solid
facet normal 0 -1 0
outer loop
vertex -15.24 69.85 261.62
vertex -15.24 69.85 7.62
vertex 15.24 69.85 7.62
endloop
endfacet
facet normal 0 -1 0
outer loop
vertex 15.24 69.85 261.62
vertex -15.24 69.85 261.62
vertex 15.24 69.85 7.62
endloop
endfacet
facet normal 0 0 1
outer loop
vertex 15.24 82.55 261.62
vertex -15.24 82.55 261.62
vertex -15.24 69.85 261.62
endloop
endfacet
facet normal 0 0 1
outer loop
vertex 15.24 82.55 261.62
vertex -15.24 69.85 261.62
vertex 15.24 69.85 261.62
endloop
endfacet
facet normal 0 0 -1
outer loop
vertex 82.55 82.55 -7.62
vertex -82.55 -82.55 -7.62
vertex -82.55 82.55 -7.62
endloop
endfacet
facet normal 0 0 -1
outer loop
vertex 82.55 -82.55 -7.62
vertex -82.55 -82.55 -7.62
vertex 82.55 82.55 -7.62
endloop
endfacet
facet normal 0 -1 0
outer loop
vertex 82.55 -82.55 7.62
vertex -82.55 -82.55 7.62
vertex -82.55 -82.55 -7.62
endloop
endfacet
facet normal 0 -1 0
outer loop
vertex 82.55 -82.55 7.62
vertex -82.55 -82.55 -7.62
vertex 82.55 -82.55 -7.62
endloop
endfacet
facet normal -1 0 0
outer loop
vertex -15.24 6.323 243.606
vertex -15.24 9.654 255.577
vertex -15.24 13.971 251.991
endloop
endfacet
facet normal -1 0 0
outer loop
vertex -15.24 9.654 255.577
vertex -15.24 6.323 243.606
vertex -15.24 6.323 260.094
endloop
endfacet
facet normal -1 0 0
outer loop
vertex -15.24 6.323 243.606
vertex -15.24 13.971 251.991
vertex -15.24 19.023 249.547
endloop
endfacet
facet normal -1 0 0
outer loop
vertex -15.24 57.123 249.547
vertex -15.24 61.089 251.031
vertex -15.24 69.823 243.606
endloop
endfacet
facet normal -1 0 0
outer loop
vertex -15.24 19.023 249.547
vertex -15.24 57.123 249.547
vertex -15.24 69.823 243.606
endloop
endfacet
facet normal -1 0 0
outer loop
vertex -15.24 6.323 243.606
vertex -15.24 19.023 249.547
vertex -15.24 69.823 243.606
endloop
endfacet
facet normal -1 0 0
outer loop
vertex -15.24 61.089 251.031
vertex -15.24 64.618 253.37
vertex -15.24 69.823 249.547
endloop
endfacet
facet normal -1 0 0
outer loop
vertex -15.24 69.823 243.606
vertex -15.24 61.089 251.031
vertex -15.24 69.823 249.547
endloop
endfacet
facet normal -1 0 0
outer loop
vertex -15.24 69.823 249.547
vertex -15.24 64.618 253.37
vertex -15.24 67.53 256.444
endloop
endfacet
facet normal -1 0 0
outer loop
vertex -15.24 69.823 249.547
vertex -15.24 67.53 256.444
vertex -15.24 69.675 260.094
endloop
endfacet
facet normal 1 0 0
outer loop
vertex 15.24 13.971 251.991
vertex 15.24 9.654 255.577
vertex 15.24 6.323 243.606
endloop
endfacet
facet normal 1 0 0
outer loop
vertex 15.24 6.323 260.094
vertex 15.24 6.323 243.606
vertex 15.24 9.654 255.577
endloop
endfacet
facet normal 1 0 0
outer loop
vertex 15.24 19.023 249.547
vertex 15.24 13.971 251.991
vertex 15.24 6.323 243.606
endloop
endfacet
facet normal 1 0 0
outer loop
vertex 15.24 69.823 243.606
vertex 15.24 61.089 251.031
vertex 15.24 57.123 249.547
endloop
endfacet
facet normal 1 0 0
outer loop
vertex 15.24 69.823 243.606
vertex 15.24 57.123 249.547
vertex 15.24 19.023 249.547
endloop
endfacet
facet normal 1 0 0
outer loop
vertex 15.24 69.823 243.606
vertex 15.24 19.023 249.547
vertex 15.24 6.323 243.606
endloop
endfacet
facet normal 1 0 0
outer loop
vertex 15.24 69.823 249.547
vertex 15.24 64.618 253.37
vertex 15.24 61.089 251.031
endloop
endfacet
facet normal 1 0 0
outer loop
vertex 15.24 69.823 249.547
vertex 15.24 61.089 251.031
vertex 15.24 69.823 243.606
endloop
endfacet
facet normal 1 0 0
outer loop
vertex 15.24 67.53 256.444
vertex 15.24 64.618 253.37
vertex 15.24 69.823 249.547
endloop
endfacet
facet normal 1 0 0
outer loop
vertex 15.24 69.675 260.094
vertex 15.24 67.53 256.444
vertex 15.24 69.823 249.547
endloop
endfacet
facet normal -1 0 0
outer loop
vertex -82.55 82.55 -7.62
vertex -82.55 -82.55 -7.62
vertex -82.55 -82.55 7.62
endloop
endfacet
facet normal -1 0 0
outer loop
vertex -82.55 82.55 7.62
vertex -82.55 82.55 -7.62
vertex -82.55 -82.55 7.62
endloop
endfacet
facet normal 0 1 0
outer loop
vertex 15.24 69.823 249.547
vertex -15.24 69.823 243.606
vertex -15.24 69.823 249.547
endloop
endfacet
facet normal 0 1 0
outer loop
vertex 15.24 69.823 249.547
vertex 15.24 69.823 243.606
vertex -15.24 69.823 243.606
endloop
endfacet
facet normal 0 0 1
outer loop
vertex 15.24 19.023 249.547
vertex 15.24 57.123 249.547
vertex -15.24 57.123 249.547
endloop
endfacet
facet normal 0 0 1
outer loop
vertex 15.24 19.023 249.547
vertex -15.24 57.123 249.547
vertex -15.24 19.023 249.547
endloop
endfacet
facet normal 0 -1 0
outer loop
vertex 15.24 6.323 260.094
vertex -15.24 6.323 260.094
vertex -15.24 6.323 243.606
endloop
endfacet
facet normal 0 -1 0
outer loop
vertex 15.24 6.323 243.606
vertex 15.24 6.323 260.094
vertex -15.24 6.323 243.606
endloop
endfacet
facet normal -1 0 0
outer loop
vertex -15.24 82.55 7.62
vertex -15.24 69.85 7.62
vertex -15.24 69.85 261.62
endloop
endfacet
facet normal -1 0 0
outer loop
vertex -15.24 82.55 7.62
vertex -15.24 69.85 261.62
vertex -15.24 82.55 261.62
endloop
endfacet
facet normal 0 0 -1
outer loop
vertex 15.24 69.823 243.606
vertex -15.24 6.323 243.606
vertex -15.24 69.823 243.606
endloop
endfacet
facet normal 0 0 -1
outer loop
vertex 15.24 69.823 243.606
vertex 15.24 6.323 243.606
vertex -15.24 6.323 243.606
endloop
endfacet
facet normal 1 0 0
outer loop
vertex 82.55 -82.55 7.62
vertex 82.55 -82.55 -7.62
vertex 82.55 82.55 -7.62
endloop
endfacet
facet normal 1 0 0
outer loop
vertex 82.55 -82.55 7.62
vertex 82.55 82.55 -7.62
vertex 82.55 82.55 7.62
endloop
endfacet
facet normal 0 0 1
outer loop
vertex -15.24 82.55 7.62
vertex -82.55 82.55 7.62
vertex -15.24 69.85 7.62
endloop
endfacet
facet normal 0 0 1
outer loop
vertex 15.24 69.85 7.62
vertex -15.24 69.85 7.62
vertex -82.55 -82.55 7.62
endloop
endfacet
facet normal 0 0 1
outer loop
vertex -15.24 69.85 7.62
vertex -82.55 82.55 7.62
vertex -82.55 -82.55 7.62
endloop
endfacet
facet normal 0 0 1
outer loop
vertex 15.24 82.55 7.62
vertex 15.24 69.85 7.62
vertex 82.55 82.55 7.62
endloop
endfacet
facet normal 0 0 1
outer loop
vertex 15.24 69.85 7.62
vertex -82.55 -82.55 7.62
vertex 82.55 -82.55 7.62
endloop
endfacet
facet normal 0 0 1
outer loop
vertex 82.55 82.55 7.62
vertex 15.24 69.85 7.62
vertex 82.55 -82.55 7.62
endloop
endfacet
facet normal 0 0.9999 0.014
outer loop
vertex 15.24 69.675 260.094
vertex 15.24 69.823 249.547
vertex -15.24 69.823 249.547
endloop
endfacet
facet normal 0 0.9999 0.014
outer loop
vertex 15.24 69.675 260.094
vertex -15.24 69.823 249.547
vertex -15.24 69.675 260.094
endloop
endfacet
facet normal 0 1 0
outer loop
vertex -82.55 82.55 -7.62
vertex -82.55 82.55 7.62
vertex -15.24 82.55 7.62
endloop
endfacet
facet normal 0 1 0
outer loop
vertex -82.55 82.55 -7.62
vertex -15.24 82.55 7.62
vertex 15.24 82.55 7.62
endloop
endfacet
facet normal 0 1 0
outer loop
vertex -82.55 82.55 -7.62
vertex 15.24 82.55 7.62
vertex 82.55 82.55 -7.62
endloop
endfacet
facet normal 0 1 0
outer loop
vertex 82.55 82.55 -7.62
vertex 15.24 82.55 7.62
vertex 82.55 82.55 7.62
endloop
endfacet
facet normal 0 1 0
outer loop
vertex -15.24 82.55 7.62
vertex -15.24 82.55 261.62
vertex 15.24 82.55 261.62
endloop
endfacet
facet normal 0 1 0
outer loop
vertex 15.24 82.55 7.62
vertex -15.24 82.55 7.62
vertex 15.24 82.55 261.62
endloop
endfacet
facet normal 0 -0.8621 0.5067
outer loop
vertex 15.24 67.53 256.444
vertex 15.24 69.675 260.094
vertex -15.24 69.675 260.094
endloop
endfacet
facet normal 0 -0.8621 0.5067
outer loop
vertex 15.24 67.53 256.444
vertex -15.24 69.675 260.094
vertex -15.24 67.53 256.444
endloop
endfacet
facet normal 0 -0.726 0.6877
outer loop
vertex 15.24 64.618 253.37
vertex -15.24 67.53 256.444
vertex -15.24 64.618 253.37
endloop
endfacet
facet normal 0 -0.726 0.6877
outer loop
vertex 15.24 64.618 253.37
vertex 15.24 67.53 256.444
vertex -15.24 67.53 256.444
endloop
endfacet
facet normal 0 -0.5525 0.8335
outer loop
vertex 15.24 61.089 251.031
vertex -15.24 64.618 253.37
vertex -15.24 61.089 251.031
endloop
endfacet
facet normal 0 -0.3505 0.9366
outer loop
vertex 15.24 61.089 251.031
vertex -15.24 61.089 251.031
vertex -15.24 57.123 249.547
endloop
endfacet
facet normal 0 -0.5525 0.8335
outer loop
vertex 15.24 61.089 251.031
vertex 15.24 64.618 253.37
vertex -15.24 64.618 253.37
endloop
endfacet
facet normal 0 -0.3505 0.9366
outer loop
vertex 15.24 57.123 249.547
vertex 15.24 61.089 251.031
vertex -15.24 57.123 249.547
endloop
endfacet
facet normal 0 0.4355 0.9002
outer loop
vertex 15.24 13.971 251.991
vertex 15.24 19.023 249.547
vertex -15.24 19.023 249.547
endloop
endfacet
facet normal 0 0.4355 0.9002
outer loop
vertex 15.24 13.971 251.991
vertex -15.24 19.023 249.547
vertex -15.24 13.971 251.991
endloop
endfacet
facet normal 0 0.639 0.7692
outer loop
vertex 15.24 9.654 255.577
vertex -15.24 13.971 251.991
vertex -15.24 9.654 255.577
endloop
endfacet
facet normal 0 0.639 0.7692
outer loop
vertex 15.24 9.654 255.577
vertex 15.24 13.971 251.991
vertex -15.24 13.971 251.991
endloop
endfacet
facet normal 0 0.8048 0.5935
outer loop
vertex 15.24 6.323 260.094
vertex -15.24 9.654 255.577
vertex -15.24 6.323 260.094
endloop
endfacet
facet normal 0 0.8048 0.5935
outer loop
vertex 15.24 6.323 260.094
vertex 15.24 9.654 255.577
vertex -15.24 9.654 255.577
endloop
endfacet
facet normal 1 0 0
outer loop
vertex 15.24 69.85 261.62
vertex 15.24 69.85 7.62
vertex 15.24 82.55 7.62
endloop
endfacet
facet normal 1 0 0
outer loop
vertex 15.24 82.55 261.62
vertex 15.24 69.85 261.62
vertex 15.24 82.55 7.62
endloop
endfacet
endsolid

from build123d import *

# Parameters (mm, degrees)
F0_W     = 165.1
F0_H     = 15.24
F1_DEPTH = 82.55
F2_W     = 30.48
F2_H     = 12.7
F3_DEPTH = 254
F5_DEPTH = 15.24


with BuildPart() as f1:
    # F0 (on Front) → F1 (new body, symmetric)
    with BuildSketch(Plane.XZ):
        Rectangle(F0_W, F0_H)
    extrude(amount=F1_DEPTH, both=True)

    # F2 (on face) → F3 (join)
    with BuildSketch(Plane.XY.offset(7.62)):
        with Locations((0, 76.2)):
            Rectangle(F2_W, F2_H)
    extrude(amount=F3_DEPTH)


with BuildPart() as f5:
    # F4 (on Right) → F5 (new body, symmetric)
    with BuildSketch(Plane.YZ):
        Polygon((69.8231831193, 243.6058757288), (69.8231831193, 249.5466768742), (57.1231831193, 249.5466768742), (19.0231831193, 249.5466768742), (6.3231831193, 249.5466768742), (6.3231831193, 243.6058757288), align=None)
        with BuildLine():
            Line((57.1231831193, 249.5466768742), (69.8231831193, 249.5466768742))
            Line((69.8231831193, 249.5466768742), (69.6746185422, 260.0943446159))
            ThreePointArc((69.6746185422, 260.0943446159), (64.6179404455, 253.3698870264), (57.1231831193, 249.5466768742))
        make_face()
        with BuildLine():
            Line((6.3231831193, 249.5466768742), (19.0231831193, 249.5466768742))
            ThreePointArc((19.0231831193, 249.5466768742), (11.7038459616, 253.653372928), (6.3231831193, 260.0943446159))
            Line((6.3231831193, 260.0943446159), (6.3231831193, 249.5466768742))
        make_face()
    extrude(amount=F5_DEPTH, both=True)


solid = Compound([f1.part, f5.part])
